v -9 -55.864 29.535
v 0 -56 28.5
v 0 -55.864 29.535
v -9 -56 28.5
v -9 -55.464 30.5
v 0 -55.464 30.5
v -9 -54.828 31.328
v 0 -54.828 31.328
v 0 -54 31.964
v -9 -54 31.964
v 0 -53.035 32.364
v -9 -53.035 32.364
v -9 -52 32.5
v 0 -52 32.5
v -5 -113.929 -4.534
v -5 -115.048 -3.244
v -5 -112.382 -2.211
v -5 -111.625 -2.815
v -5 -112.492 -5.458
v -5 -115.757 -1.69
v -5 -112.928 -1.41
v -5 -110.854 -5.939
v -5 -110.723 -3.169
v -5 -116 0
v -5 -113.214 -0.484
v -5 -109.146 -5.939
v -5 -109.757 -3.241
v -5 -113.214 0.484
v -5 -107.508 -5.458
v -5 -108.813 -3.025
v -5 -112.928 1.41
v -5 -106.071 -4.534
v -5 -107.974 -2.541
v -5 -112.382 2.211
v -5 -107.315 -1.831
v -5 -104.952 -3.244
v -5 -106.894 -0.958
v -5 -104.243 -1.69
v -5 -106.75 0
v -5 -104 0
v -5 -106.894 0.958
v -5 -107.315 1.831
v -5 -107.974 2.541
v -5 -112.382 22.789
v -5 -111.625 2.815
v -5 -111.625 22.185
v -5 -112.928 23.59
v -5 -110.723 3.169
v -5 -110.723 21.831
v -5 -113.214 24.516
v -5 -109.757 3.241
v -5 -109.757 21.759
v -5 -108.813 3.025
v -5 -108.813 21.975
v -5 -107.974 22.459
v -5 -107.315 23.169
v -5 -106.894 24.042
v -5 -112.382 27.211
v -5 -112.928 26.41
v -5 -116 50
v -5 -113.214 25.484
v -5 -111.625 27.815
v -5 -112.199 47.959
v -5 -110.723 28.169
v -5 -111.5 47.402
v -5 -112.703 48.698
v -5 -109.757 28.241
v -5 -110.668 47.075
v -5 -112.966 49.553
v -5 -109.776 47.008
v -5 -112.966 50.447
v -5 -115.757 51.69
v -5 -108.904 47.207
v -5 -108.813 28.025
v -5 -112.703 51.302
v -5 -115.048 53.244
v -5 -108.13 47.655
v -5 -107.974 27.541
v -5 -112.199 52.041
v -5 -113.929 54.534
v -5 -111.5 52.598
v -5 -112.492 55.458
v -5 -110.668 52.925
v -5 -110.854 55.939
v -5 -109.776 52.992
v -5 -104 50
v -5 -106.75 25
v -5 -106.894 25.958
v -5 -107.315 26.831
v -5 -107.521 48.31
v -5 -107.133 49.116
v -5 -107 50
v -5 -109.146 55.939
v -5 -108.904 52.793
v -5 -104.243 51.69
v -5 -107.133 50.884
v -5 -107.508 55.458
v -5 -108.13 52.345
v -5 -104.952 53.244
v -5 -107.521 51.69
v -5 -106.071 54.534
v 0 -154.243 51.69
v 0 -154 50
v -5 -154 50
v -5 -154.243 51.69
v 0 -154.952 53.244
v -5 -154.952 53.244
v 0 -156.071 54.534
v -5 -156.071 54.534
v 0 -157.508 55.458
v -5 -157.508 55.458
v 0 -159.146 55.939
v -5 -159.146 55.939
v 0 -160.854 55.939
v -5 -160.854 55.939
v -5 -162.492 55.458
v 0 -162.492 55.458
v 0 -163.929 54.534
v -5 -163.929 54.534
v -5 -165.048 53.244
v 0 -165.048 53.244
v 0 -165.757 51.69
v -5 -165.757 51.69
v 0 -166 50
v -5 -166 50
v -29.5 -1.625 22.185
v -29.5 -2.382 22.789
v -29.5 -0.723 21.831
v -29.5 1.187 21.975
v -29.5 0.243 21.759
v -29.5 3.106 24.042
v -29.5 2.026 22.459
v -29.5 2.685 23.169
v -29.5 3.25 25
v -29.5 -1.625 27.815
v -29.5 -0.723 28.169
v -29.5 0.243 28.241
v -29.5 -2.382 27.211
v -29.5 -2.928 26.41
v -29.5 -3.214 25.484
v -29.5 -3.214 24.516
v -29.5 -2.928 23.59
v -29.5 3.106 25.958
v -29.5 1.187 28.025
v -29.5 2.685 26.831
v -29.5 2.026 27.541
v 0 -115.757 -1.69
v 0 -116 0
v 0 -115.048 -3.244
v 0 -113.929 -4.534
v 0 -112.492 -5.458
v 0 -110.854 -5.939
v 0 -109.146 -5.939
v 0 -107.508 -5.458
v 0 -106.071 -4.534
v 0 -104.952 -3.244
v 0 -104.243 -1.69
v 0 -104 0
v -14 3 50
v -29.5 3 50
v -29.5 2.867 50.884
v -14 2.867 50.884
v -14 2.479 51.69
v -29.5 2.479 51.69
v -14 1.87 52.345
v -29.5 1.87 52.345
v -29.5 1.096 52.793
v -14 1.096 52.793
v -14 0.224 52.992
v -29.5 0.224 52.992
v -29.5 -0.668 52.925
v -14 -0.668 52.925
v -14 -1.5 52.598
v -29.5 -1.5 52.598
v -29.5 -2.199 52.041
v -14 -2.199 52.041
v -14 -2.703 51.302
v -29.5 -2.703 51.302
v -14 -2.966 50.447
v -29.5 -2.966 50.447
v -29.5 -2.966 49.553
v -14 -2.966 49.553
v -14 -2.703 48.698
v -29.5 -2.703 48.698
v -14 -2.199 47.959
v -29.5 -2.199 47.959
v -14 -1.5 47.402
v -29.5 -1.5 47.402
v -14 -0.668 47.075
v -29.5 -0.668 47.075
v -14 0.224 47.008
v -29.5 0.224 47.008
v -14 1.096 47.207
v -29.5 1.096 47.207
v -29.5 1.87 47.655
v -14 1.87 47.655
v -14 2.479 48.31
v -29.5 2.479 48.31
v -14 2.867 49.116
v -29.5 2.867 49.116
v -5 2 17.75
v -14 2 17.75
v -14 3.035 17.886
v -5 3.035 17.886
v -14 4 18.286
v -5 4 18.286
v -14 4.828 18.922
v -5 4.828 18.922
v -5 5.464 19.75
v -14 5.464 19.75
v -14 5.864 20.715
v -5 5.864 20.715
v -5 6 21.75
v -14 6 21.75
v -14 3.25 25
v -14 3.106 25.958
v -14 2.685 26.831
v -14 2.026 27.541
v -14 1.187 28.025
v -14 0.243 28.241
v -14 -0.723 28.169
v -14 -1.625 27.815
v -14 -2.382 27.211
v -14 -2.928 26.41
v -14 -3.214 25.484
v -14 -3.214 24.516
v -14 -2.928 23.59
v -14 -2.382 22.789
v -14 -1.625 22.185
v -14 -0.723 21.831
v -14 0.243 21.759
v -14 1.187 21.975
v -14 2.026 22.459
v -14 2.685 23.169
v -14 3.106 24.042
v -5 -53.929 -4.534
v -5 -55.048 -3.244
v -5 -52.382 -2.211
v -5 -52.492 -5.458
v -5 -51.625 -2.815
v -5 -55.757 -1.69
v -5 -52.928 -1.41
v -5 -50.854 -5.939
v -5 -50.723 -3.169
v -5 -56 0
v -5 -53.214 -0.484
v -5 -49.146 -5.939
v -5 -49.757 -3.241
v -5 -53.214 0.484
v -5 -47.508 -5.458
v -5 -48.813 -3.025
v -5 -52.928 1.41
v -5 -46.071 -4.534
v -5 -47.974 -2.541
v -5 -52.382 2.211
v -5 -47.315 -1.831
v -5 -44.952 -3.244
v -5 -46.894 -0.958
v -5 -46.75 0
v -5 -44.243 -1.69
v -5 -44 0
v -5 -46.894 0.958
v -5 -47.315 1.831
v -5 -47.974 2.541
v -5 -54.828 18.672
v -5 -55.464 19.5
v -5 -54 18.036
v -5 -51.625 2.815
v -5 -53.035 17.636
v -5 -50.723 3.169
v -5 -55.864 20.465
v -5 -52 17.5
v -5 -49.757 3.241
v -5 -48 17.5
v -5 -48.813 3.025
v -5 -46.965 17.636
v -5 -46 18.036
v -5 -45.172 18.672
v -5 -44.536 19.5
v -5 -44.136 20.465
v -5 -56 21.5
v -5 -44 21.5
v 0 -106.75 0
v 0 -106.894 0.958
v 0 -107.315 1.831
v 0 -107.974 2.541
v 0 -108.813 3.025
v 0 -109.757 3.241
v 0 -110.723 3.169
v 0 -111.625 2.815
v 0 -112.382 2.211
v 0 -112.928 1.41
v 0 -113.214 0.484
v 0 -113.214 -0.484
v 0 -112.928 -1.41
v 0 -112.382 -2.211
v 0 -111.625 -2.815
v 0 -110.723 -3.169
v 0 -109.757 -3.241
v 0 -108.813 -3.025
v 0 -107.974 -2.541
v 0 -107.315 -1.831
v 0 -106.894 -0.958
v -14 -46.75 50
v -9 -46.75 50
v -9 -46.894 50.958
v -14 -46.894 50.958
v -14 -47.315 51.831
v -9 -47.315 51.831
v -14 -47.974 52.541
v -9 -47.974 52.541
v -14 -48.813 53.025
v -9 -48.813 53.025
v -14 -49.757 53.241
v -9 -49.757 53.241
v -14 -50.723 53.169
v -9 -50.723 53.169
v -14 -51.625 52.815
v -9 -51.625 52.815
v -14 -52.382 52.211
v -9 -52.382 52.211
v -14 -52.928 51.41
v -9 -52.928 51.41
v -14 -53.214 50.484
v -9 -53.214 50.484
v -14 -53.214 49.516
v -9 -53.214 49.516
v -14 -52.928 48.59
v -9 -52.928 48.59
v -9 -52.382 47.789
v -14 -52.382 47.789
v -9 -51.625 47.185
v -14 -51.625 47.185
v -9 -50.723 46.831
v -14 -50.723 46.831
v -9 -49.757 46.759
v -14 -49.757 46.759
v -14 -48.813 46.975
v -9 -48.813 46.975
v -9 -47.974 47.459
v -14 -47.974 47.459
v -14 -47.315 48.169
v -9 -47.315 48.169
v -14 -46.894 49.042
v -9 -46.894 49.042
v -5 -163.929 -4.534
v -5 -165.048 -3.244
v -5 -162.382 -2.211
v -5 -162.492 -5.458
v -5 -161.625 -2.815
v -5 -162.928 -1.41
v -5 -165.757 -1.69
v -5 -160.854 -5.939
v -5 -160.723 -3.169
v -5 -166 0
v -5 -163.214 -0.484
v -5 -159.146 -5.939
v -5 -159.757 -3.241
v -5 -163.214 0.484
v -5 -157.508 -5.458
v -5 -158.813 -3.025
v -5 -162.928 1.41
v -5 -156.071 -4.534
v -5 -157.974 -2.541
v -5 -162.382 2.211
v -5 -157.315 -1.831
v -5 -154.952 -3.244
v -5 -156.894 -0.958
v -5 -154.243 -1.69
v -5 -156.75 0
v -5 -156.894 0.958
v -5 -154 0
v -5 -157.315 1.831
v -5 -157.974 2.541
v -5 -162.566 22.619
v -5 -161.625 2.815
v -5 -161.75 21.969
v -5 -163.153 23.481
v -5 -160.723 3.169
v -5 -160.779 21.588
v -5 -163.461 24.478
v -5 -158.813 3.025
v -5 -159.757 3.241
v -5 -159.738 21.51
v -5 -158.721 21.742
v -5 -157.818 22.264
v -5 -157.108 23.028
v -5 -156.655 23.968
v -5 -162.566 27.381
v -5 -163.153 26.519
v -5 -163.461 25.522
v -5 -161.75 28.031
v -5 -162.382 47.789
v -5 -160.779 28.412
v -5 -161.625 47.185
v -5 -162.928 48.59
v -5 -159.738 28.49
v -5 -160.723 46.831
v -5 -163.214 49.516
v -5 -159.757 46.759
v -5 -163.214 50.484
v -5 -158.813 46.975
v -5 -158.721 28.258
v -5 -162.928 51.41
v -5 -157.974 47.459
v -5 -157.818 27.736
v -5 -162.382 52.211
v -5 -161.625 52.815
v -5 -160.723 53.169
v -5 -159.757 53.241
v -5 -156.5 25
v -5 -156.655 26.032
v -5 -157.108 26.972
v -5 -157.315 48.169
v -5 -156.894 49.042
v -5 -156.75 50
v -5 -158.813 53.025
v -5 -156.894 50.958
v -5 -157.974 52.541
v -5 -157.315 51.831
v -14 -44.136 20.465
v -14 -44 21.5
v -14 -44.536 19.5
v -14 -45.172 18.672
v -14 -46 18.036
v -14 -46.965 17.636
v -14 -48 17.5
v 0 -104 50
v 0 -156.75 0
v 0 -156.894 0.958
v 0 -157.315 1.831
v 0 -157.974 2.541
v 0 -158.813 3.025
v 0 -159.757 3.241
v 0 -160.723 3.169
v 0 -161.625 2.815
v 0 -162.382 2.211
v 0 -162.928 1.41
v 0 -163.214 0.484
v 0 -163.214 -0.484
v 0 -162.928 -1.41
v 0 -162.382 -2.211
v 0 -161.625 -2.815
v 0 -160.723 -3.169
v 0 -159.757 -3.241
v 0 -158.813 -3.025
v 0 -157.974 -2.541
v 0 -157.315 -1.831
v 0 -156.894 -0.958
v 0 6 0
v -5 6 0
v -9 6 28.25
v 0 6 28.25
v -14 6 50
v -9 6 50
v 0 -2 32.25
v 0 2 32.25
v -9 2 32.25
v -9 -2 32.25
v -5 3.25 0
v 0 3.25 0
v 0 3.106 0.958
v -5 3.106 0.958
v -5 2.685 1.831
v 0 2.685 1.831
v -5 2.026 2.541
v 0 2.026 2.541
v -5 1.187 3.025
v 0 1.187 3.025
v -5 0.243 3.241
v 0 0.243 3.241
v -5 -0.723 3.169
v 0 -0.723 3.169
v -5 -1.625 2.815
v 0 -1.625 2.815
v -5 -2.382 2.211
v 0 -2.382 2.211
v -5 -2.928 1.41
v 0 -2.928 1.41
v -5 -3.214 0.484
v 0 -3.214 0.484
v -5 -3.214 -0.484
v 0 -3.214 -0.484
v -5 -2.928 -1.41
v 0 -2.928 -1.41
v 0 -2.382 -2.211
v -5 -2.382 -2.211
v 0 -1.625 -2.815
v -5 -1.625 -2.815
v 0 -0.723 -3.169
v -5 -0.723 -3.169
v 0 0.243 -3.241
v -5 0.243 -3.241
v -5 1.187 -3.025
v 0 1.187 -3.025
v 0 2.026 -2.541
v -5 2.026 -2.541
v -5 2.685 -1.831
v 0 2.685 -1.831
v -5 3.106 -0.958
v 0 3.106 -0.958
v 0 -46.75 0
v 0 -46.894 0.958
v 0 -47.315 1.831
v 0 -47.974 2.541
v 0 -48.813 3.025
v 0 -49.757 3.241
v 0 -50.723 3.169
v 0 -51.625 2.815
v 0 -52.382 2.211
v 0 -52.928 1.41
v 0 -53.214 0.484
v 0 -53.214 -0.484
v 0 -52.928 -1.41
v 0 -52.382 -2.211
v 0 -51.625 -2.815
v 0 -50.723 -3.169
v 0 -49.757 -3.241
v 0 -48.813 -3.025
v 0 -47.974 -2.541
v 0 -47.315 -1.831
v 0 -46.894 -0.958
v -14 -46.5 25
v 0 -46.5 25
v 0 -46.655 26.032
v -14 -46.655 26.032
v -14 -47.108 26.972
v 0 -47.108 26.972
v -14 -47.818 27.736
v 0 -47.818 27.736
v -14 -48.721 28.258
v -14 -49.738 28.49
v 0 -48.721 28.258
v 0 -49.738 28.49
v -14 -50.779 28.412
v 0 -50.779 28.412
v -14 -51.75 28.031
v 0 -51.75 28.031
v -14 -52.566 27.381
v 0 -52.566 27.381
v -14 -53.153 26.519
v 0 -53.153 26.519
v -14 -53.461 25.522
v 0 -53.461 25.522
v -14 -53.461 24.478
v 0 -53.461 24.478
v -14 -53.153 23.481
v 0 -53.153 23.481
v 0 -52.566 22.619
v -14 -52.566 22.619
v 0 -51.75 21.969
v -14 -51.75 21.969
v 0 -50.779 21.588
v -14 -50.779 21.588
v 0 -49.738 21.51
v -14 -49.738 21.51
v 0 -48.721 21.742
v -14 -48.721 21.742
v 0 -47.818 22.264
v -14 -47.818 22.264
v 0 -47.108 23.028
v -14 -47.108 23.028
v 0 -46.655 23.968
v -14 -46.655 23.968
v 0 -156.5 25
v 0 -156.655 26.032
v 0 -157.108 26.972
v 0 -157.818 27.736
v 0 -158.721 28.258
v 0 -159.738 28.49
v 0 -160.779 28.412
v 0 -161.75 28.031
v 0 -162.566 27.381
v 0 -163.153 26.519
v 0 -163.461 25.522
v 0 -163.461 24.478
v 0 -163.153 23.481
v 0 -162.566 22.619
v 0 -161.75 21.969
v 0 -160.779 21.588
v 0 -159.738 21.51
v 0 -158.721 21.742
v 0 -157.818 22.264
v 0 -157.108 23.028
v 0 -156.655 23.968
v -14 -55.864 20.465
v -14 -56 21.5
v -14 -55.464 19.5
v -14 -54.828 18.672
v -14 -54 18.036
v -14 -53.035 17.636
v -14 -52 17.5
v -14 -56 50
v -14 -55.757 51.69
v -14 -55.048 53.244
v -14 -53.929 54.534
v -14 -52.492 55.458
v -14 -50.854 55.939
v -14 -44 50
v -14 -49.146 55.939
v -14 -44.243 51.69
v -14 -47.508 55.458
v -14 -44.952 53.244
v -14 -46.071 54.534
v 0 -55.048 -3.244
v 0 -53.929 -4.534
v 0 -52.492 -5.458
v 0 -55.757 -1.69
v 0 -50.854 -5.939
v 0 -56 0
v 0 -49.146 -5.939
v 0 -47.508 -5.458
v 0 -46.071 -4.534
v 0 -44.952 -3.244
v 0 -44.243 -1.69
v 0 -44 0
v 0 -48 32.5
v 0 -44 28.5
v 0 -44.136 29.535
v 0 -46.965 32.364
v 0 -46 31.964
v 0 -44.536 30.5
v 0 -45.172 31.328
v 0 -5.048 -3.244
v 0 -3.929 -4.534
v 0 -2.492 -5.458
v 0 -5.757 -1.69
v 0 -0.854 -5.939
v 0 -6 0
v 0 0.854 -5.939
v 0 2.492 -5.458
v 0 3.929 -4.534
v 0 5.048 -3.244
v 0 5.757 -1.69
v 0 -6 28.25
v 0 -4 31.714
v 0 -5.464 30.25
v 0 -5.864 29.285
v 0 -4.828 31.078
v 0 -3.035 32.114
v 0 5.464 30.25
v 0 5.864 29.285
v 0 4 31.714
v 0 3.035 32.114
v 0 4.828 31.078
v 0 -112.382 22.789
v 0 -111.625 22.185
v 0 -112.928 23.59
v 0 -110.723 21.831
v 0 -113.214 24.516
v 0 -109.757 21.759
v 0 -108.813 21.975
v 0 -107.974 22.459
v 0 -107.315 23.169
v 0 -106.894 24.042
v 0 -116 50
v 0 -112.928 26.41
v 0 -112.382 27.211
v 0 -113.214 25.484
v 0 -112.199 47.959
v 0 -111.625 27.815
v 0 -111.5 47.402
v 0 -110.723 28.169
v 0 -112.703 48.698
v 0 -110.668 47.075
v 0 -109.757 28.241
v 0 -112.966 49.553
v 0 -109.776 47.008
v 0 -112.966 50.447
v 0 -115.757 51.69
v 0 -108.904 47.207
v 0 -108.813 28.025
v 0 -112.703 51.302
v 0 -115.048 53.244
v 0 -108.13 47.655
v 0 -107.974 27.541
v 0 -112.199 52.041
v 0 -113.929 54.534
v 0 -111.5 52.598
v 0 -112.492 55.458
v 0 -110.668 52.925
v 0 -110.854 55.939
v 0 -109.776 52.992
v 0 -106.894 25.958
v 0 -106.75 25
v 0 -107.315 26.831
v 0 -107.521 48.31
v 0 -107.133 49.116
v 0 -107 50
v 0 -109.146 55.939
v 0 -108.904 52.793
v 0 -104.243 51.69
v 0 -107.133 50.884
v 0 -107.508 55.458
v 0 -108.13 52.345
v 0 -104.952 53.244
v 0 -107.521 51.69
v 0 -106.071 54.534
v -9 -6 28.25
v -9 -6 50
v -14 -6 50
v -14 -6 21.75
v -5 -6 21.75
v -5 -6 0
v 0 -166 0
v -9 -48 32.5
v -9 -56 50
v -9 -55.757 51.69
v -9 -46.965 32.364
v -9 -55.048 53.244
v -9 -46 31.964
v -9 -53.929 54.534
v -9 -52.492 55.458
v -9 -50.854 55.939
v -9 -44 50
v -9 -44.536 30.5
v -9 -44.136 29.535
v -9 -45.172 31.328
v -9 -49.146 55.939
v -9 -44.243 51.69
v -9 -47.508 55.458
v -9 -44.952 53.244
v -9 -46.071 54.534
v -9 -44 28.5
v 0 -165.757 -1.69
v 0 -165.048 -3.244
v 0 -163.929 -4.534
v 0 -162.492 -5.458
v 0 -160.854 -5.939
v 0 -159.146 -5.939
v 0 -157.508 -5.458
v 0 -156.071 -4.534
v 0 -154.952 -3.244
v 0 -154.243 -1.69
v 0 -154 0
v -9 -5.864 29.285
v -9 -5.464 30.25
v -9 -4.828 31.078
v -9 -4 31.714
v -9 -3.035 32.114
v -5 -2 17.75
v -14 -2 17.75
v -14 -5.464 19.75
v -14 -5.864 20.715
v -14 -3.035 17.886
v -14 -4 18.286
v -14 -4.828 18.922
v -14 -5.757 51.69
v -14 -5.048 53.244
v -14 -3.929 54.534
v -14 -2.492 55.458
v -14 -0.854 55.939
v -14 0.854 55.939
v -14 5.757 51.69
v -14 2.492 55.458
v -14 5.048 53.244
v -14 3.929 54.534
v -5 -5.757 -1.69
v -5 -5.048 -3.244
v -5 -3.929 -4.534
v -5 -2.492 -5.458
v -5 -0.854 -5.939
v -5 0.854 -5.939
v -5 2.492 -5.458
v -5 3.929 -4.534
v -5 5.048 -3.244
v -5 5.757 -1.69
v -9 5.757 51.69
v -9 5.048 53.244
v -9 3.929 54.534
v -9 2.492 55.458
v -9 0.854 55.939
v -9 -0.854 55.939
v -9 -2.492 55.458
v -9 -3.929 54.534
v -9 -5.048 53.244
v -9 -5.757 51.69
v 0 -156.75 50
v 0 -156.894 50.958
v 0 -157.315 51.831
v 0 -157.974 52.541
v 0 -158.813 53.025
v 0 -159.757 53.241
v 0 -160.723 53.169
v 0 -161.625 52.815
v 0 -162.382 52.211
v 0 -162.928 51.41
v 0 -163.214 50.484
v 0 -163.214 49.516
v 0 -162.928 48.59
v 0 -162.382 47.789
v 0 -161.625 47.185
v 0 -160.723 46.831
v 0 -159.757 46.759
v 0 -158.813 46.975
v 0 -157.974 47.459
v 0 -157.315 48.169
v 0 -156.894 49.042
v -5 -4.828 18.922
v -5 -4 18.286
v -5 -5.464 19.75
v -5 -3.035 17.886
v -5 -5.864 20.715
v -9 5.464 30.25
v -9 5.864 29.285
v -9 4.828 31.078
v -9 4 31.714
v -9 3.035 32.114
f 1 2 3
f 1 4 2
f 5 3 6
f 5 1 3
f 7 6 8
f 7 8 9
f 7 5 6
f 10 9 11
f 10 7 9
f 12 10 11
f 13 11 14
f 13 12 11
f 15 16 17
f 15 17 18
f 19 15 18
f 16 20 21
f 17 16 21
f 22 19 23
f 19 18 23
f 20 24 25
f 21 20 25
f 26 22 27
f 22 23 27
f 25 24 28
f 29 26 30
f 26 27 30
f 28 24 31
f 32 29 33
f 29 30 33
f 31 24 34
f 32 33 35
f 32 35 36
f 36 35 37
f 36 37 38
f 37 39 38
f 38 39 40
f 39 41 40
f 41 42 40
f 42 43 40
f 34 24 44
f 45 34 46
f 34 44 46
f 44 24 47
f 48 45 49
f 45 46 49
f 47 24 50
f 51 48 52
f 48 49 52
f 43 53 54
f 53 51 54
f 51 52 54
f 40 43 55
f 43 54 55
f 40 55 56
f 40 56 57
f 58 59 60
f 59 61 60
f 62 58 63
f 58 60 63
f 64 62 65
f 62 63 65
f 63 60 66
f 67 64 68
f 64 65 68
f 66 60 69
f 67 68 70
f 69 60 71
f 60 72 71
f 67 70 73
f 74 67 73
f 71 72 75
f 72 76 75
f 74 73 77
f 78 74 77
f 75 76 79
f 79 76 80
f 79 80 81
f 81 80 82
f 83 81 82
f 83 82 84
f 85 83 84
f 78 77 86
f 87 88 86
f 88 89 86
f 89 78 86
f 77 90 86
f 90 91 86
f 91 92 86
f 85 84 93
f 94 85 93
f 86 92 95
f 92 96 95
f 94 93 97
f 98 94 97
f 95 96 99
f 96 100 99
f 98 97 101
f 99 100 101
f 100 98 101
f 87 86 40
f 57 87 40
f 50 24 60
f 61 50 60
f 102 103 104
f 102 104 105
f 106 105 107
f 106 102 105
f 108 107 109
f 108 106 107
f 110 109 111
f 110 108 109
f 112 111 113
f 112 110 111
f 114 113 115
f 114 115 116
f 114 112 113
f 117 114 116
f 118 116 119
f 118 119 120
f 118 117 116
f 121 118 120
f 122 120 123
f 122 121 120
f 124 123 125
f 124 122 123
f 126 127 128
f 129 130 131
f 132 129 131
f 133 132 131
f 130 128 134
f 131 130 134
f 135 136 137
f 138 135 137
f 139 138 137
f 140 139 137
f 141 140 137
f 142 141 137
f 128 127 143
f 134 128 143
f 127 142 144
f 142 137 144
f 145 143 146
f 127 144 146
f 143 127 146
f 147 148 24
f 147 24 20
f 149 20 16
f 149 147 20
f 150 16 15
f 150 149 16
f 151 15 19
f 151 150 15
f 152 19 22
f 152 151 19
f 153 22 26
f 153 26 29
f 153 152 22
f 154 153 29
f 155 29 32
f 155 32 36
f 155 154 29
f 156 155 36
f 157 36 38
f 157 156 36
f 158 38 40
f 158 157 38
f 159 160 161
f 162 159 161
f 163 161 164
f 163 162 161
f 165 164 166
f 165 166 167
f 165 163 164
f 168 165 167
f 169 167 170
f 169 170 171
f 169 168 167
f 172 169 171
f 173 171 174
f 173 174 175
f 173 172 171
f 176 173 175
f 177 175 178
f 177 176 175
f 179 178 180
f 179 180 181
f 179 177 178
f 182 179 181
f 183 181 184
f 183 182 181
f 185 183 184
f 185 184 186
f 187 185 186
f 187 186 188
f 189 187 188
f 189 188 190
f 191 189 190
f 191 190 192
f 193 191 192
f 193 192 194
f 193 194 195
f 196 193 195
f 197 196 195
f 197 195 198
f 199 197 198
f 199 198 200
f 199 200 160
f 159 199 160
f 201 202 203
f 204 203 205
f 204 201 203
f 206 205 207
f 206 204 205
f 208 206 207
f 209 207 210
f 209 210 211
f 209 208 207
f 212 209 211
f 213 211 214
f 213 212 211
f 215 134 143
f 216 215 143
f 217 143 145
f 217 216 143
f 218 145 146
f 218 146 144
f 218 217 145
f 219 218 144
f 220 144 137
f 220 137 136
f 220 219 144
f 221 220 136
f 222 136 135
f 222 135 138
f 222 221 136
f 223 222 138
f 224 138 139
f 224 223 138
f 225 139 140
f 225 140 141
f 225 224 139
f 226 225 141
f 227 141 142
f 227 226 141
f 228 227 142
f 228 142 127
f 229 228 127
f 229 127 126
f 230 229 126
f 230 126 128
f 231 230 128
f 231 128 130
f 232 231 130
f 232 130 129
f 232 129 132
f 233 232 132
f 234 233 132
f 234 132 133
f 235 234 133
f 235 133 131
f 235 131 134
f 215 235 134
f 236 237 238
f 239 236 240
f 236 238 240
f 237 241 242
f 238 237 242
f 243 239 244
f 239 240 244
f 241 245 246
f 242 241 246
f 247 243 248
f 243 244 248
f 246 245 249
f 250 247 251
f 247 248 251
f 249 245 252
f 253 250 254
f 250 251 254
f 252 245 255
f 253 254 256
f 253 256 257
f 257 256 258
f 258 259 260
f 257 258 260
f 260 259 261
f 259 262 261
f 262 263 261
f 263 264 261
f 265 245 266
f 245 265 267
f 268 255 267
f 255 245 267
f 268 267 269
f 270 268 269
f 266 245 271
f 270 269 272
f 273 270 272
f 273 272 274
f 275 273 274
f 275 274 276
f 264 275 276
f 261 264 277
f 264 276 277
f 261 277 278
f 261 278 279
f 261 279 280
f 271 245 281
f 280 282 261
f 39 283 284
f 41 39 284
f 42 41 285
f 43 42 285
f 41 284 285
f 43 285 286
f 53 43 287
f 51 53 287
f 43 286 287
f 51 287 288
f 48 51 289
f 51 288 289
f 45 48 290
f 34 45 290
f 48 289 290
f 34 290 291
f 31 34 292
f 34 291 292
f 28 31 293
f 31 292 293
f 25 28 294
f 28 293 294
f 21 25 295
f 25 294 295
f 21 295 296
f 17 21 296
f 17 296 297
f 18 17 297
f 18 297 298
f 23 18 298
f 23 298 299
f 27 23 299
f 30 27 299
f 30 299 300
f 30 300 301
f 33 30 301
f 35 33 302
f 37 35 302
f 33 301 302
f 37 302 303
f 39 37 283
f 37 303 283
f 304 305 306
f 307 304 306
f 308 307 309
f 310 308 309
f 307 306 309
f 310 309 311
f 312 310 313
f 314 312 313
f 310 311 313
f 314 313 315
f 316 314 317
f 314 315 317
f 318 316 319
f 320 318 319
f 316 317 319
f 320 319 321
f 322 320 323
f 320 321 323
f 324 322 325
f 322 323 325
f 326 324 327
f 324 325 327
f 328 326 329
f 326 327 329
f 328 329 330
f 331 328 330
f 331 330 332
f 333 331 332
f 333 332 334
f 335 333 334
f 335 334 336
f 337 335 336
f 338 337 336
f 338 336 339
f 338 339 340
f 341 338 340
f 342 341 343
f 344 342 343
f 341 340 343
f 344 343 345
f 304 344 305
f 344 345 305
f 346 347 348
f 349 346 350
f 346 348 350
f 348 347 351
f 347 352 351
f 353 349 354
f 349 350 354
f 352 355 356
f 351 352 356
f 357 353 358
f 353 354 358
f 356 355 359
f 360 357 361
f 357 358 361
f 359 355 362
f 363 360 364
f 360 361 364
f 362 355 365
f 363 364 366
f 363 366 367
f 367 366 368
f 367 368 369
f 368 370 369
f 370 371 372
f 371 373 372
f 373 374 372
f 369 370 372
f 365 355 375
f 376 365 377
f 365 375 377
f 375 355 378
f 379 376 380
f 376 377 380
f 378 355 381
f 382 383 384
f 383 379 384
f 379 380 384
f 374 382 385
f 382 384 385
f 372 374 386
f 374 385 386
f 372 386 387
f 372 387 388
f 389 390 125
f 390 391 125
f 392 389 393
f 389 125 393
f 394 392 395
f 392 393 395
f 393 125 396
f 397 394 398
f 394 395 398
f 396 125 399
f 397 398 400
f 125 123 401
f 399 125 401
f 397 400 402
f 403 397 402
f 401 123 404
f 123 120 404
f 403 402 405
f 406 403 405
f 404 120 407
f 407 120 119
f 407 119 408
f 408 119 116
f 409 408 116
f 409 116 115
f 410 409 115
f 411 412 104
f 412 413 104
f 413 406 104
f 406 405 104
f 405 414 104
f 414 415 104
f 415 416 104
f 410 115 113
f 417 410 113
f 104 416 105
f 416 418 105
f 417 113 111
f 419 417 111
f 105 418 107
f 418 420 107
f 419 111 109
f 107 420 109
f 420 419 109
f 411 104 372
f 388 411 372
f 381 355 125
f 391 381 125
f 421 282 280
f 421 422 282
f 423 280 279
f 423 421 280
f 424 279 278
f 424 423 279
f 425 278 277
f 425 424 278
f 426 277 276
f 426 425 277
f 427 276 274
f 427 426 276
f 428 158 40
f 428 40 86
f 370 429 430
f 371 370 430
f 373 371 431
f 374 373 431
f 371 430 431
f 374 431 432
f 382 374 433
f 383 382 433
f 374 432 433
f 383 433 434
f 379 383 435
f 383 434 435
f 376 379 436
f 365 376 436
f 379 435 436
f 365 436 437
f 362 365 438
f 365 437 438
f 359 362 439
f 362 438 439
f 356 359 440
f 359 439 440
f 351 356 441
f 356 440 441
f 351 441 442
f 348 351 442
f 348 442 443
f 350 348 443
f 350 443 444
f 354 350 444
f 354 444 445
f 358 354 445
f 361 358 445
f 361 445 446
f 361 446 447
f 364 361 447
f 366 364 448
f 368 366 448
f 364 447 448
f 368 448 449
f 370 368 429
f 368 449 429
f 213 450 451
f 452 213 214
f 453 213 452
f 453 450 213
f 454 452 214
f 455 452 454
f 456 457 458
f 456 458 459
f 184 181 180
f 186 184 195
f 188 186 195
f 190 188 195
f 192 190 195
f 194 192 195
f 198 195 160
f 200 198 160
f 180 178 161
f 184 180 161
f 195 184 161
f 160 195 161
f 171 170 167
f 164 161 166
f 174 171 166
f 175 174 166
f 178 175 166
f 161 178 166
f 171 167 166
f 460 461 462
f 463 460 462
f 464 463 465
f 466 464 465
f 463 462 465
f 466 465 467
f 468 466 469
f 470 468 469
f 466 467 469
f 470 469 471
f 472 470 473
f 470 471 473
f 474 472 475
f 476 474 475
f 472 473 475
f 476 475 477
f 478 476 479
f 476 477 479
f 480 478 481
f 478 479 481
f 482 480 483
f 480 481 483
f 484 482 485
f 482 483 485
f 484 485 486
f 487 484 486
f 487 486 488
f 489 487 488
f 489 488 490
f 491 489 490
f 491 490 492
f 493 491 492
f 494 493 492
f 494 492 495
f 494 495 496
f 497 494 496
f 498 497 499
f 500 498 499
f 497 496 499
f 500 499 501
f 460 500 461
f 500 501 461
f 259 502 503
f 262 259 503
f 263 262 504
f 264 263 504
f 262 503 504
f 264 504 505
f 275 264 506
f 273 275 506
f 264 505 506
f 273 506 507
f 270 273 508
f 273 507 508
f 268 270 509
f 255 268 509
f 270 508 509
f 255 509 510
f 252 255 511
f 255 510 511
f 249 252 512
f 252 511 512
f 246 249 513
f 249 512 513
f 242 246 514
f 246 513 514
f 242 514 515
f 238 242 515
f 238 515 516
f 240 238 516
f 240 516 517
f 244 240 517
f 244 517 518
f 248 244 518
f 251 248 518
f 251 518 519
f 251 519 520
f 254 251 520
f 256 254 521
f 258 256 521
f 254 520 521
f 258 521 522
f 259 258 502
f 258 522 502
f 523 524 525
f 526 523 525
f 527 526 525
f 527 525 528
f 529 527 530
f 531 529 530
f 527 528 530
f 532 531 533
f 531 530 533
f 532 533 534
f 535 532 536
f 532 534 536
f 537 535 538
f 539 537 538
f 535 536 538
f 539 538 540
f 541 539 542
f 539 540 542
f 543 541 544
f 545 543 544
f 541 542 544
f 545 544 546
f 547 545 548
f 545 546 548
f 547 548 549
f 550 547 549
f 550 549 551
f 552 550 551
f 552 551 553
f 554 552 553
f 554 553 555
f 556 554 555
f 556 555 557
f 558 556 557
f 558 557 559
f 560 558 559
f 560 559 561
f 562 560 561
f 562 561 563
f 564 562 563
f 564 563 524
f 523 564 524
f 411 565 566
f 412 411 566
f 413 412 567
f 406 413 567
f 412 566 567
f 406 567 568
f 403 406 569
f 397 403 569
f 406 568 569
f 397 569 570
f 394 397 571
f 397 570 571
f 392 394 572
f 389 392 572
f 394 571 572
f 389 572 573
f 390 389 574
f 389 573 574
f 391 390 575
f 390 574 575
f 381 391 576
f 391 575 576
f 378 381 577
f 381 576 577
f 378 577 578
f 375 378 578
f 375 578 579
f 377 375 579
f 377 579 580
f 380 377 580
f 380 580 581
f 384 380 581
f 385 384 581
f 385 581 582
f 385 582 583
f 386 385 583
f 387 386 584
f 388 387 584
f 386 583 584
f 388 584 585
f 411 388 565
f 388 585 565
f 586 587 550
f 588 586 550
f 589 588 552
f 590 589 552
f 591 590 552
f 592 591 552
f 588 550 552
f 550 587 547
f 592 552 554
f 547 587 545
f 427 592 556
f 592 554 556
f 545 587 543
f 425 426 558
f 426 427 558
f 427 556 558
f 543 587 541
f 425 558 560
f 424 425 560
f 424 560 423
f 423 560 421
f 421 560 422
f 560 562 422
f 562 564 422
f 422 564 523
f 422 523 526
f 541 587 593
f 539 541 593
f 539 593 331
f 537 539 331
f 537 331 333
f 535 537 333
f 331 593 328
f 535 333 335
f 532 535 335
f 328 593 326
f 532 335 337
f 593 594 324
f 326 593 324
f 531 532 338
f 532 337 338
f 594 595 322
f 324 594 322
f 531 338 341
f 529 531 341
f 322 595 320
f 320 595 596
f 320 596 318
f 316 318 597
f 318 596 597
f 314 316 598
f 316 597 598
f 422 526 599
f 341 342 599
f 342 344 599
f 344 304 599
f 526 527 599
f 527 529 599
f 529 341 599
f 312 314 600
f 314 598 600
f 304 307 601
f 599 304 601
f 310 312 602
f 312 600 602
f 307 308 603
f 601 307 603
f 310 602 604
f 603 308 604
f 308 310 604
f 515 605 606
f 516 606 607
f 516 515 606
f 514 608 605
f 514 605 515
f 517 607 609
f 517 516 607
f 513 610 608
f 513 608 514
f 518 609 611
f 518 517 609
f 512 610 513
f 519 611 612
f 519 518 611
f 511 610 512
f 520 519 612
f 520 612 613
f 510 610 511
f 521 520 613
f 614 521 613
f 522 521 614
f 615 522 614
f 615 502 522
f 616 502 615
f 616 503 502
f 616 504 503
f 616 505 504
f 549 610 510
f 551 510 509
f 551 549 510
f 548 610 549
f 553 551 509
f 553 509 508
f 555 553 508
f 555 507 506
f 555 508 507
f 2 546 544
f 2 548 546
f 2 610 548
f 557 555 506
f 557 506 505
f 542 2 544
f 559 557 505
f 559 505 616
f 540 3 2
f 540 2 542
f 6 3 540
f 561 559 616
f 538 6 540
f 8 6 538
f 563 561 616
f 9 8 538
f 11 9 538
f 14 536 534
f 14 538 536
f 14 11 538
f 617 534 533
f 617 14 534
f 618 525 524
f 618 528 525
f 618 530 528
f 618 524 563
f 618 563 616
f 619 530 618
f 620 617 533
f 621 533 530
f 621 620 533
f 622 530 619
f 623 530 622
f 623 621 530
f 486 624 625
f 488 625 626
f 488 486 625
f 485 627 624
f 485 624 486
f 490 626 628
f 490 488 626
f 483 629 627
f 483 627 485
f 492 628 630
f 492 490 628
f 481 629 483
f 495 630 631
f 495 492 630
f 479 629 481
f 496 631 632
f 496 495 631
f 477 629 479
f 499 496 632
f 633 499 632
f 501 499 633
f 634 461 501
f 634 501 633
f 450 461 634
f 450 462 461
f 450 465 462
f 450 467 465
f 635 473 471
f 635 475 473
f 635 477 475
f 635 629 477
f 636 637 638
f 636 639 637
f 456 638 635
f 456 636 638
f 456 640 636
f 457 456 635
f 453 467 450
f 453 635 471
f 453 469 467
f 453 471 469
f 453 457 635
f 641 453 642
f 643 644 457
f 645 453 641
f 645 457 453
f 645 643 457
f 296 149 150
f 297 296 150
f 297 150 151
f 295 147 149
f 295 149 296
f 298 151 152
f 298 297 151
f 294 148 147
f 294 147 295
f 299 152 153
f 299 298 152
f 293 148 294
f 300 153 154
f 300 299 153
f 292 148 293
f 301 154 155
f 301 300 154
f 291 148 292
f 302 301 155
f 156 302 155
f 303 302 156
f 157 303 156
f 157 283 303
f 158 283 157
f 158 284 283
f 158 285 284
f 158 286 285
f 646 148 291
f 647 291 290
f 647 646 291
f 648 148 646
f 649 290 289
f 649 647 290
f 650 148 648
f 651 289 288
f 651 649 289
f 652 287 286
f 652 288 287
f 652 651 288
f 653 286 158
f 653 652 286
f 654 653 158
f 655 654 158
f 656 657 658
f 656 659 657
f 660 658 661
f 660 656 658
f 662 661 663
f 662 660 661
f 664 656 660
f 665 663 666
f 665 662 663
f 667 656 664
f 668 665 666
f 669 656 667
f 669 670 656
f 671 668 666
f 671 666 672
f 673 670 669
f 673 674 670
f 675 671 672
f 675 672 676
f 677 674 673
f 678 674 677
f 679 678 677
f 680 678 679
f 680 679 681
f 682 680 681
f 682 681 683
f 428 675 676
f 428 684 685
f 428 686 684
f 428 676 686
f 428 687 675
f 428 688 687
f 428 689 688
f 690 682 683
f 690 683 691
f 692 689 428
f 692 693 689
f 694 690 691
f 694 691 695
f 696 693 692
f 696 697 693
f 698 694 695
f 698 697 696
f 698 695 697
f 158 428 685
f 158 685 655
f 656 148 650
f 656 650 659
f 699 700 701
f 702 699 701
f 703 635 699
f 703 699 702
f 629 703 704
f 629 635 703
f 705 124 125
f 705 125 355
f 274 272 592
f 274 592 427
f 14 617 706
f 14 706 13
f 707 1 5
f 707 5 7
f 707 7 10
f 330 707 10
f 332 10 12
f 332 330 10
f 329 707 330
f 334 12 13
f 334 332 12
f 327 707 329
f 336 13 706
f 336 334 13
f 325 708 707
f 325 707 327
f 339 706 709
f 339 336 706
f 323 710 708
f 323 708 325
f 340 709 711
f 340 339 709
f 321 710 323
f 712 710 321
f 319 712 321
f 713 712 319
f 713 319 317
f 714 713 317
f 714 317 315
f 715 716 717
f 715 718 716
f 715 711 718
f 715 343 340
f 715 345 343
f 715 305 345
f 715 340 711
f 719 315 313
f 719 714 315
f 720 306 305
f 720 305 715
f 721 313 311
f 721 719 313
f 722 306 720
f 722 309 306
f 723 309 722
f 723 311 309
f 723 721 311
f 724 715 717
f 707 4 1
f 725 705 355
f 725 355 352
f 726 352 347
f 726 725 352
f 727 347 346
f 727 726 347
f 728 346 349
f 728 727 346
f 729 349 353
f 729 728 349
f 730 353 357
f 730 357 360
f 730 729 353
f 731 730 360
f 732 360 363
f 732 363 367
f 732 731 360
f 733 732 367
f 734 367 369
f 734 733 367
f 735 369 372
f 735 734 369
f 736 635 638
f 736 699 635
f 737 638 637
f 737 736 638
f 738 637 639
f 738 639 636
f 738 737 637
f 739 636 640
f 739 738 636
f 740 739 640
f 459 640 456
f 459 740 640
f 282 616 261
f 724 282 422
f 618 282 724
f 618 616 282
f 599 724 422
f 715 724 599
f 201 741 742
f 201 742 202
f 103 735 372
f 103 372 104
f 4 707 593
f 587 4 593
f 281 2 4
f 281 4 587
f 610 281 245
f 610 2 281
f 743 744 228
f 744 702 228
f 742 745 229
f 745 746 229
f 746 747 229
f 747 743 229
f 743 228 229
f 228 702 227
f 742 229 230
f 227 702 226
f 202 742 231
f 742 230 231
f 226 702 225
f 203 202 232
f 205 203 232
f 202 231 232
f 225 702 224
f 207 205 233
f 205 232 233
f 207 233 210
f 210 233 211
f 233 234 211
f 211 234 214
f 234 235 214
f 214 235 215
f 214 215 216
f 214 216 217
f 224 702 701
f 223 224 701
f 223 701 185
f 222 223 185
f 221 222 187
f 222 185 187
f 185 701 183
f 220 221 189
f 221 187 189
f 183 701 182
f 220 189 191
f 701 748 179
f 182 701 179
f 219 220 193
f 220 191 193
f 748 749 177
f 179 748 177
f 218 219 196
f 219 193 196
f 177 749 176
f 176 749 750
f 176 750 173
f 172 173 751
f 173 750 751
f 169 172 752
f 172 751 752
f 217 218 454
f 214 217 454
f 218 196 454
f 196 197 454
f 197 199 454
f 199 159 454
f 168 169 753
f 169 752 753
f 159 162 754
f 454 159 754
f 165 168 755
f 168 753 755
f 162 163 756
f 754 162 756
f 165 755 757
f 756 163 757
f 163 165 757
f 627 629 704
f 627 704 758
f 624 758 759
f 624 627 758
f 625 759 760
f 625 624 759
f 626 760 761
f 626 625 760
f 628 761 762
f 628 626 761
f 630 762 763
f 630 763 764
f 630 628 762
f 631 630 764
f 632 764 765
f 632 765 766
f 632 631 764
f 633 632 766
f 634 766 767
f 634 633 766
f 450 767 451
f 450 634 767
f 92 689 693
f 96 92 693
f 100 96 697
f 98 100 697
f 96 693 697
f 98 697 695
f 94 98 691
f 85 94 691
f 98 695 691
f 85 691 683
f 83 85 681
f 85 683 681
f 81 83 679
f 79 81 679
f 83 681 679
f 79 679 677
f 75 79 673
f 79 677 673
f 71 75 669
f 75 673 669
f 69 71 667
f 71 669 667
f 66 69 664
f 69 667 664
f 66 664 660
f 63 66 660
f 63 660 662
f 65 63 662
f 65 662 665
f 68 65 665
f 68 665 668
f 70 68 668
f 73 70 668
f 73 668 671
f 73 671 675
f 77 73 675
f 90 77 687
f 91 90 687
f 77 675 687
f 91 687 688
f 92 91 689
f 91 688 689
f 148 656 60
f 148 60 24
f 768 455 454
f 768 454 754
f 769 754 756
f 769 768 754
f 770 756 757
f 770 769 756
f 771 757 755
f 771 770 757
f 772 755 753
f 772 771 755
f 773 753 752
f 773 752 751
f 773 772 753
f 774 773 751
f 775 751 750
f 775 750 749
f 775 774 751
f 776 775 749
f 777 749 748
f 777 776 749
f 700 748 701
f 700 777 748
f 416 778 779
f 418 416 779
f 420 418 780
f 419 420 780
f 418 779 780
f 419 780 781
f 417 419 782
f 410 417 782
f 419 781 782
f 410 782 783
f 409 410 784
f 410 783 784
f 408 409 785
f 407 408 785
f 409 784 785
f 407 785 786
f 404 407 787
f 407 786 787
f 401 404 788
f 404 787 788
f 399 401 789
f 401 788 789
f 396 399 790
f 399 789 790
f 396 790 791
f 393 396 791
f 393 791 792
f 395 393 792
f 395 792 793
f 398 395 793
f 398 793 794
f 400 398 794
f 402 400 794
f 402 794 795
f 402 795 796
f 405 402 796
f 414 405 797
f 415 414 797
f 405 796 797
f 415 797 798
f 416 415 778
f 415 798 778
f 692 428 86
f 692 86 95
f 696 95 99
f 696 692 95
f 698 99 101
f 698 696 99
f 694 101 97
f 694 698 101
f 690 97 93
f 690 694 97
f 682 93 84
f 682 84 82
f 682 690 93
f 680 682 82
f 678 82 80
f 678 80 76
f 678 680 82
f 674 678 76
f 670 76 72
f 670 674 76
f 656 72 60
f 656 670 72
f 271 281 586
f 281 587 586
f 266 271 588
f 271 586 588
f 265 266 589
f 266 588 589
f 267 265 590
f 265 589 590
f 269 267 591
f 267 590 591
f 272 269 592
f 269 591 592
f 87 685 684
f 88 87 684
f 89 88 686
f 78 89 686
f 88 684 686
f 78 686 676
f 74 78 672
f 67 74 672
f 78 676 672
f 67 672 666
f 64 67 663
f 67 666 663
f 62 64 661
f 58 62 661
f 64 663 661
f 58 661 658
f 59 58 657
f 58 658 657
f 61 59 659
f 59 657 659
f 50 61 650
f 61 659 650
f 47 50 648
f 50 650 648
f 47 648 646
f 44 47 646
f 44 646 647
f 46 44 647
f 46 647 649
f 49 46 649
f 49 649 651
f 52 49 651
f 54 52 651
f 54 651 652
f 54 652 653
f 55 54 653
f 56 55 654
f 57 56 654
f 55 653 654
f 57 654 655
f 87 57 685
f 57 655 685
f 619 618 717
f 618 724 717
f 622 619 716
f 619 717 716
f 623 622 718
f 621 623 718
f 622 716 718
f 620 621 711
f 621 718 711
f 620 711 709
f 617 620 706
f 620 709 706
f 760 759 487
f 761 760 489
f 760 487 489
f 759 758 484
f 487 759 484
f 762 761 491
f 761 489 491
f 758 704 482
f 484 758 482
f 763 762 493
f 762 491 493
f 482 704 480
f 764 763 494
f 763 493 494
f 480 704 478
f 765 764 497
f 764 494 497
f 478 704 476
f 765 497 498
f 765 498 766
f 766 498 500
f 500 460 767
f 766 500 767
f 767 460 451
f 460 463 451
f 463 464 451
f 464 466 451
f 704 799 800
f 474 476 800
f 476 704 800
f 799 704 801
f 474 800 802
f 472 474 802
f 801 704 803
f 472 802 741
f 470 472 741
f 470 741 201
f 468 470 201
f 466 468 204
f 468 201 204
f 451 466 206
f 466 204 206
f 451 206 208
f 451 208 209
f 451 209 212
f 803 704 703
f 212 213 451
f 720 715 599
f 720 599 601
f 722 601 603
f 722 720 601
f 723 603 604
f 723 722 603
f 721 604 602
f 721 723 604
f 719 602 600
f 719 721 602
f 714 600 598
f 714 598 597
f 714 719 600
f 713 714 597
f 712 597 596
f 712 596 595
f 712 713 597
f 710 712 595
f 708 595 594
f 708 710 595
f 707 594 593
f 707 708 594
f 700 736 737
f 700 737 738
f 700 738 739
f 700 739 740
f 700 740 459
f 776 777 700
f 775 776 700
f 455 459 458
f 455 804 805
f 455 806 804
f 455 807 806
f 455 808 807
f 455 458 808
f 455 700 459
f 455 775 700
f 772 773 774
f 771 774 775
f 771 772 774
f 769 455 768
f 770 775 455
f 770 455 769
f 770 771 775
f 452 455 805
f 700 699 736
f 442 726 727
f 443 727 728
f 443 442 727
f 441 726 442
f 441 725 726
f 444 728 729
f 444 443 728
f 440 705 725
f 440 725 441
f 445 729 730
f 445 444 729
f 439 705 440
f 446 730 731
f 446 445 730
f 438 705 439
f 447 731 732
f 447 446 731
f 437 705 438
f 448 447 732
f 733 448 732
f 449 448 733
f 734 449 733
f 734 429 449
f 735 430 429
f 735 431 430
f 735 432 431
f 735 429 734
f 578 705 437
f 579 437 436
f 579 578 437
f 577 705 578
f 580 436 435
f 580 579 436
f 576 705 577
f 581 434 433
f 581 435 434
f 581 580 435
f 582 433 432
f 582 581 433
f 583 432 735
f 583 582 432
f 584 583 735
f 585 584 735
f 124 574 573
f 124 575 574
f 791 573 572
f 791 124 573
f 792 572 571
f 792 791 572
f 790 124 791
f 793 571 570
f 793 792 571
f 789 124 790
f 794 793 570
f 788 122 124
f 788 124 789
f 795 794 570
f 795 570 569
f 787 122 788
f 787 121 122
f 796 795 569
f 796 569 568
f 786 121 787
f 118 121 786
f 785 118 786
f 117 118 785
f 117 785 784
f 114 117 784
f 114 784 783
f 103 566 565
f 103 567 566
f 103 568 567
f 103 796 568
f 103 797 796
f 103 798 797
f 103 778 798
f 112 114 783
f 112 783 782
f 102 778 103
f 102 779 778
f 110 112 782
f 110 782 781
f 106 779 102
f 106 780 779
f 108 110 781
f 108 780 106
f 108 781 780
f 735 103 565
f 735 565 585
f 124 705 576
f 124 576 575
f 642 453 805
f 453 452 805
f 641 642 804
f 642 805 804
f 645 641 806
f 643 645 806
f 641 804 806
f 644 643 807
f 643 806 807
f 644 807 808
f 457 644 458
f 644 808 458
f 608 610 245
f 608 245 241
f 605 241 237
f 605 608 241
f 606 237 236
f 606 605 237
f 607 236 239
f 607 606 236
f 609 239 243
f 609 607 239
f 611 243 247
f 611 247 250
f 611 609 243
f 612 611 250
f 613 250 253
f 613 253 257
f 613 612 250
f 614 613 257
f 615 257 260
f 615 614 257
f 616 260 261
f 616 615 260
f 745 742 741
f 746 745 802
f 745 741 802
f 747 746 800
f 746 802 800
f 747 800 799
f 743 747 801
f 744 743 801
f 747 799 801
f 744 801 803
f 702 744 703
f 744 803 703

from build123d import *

# Parameters (mm, degrees)
F0_R     = 3.25
F1_DEPTH = 5
F0_R_2   = 3.5
F0_R_3   = 3
F2_DEPTH = 14
F3_START = -9
F3_DEPTH = 5
F4_DEPTH = 29.5
F5_START = -9
F5_DEPTH = 20.5
F6_R     = 4
F6_2_R   = 4


with BuildPart() as f1:
    # F0 (on Right) → F1 (new body)
    with BuildSketch(Plane.YZ):
        with BuildLine():
            Line((-6, 17.75), (-6, 0))
            ThreePointArc((-6, 0), (0, -6), (6, 0))
            Line((6, 0), (6, 17.75))
            Line((6, 17.75), (-6, 17.75))
        make_face()
        Circle(F0_R, mode=Mode.SUBTRACT)
        Polygon((-6, 25), (-6, 17.75), (6, 17.75), (6, 25), (6, 32.25), (-6, 32.25), align=None)
        with Locations((0, 25)):
            Circle(F0_R, mode=Mode.SUBTRACT)
    extrude(amount=-F1_DEPTH)

    # F0 (on Right) → F2 (join)
    with BuildSketch(Plane.YZ):
        Polygon((-6, 25), (-6, 17.75), (6, 17.75), (6, 25), (6, 32.25), (-6, 32.25), align=None)
        with Locations((0, 25)):
            Circle(F0_R, mode=Mode.SUBTRACT)
    extrude(amount=-F2_DEPTH)

    # F0 (on Right) → F3 (join)
    with BuildSketch(Plane.YZ.offset(F3_START)):
        Polygon((-6, 25), (-6, 17.75), (6, 17.75), (6, 25), (6, 32.25), (-6, 32.25), align=None)
        with Locations((0, 25)):
            Circle(F0_R, mode=Mode.SUBTRACT)
        with BuildLine():
            Line((-6, 50), (-6, 32.25))
            Line((-6, 32.25), (6, 32.25))
            Line((6, 32.25), (6, 50))
            ThreePointArc((6, 50), (0, 56), (-6, 50))
        make_face()
        with Locations((0, 50)):
            Circle(F0_R_3, mode=Mode.SUBTRACT)
    extrude(amount=-F3_DEPTH)

    # F0 (on Right) → F4 (join)
    with BuildSketch(Plane.YZ):
        with Locations((0, 25)):
            Circle(F0_R)
    extrude(amount=-F4_DEPTH)

    # F0 (on Right) → F5 (join)
    with BuildSketch(Plane.YZ.offset(F5_START)):
        with Locations((0, 50)):
            Circle(F0_R_3)
    extrude(amount=-F5_DEPTH)

    # F6
    f6_edges = [f1.edges().sort_by_distance(p)[0] for p in [
        (-4.5, 6, 32.25),
        (-4.5, -6, 32.25),
        (-9.5, -6, 17.75),
        (-9.5, 6, 17.75),
    ]]
    fillet(f6_edges, radius=F6_R)


with BuildPart() as f1b:
    # F0 (on Right) → F1, piece 2 (new body)
    with BuildSketch(Plane.YZ):
        with BuildLine():
            Line((-56, 17.5), (-56, 0))
            ThreePointArc((-56, 0), (-50, -6), (-44, 0))
            Line((-44, 0), (-44, 17.5))
            Line((-44, 17.5), (-56, 17.5))
        make_face()
        with Locations((-50, 0)):
            Circle(F0_R, mode=Mode.SUBTRACT)
        Polygon((-56, 25), (-56, 17.5), (-44, 17.5), (-44, 25), (-44, 32.5), (-56, 32.5), align=None)
        with Locations((-50, 25)):
            Circle(F0_R_2, mode=Mode.SUBTRACT)
    extrude(amount=-F1_DEPTH)

    # F0 (on Right) → F2, piece 2 (join)
    with BuildSketch(Plane.YZ):
        Polygon((-56, 25), (-56, 17.5), (-44, 17.5), (-44, 25), (-44, 32.5), (-56, 32.5), align=None)
        with Locations((-50, 25)):
            Circle(F0_R_2, mode=Mode.SUBTRACT)
    extrude(amount=-F2_DEPTH)

    # F0 (on Right) → F3, piece 2 (join)
    with BuildSketch(Plane.YZ.offset(F3_START)):
        with BuildLine():
            Line((-56, 50), (-56, 32.5))
            Line((-56, 32.5), (-44, 32.5))
            Line((-44, 32.5), (-44, 50))
            ThreePointArc((-44, 50), (-50, 56), (-56, 50))
        make_face()
        with Locations((-50, 50)):
            Circle(F0_R, mode=Mode.SUBTRACT)
    extrude(amount=-F3_DEPTH)

    # F6#2
    f6_2_edges = [f1b.edges().sort_by_distance(p)[0] for p in [
        (-4.5, -56, 32.5),
        (-4.5, -44, 32.5),
        (-9.5, -56, 17.5),
        (-9.5, -44, 17.5),
    ]]
    fillet(f6_2_edges, radius=F6_2_R)


with BuildPart() as f1c:
    # F0 (on Right) → F1, piece 3 (new body)
    with BuildSketch(Plane.YZ):
        with BuildLine():
            Line((-116, 17.75), (-116, 0))
            ThreePointArc((-116, 0), (-110, -6), (-104, 0))
            Line((-104, 0), (-104, 17.75))
            Line((-104, 17.75), (-116, 17.75))
        make_face()
        with Locations((-110, 0)):
            Circle(F0_R, mode=Mode.SUBTRACT)
        Polygon((-116, 25), (-116, 17.75), (-104, 17.75), (-104, 25), (-104, 32.25), (-116, 32.25), align=None)
        with Locations((-110, 25)):
            Circle(F0_R, mode=Mode.SUBTRACT)
        with BuildLine():
            Line((-116, 50), (-116, 32.25))
            Line((-116, 32.25), (-104, 32.25))
            Line((-104, 32.25), (-104, 50))
            ThreePointArc((-104, 50), (-110, 56), (-116, 50))
        make_face()
        with Locations((-110, 50)):
            Circle(F0_R_3, mode=Mode.SUBTRACT)
    extrude(amount=-F1_DEPTH)


with BuildPart() as f1d:
    # F0 (on Right) → F1, piece 4 (new body)
    with BuildSketch(Plane.YZ):
        with BuildLine():
            Line((-166, 17.5), (-166, 0))
            ThreePointArc((-166, 0), (-160, -6), (-154, 0))
            Line((-154, 0), (-154, 17.5))
            Line((-154, 17.5), (-166, 17.5))
        make_face()
        with Locations((-160, 0)):
            Circle(F0_R, mode=Mode.SUBTRACT)
        Polygon((-166, 25), (-166, 17.5), (-154, 17.5), (-154, 25), (-154, 32.5), (-166, 32.5), align=None)
        with Locations((-160, 25)):
            Circle(F0_R_2, mode=Mode.SUBTRACT)
        with BuildLine():
            Line((-166, 50), (-166, 32.5))
            Line((-166, 32.5), (-154, 32.5))
            Line((-154, 32.5), (-154, 50))
            ThreePointArc((-154, 50), (-160, 56), (-166, 50))
        make_face()
        with Locations((-160, 50)):
            Circle(F0_R, mode=Mode.SUBTRACT)
    extrude(amount=-F1_DEPTH)


solid = Compound([f1.part, f1b.part, f1c.part, f1d.part])
